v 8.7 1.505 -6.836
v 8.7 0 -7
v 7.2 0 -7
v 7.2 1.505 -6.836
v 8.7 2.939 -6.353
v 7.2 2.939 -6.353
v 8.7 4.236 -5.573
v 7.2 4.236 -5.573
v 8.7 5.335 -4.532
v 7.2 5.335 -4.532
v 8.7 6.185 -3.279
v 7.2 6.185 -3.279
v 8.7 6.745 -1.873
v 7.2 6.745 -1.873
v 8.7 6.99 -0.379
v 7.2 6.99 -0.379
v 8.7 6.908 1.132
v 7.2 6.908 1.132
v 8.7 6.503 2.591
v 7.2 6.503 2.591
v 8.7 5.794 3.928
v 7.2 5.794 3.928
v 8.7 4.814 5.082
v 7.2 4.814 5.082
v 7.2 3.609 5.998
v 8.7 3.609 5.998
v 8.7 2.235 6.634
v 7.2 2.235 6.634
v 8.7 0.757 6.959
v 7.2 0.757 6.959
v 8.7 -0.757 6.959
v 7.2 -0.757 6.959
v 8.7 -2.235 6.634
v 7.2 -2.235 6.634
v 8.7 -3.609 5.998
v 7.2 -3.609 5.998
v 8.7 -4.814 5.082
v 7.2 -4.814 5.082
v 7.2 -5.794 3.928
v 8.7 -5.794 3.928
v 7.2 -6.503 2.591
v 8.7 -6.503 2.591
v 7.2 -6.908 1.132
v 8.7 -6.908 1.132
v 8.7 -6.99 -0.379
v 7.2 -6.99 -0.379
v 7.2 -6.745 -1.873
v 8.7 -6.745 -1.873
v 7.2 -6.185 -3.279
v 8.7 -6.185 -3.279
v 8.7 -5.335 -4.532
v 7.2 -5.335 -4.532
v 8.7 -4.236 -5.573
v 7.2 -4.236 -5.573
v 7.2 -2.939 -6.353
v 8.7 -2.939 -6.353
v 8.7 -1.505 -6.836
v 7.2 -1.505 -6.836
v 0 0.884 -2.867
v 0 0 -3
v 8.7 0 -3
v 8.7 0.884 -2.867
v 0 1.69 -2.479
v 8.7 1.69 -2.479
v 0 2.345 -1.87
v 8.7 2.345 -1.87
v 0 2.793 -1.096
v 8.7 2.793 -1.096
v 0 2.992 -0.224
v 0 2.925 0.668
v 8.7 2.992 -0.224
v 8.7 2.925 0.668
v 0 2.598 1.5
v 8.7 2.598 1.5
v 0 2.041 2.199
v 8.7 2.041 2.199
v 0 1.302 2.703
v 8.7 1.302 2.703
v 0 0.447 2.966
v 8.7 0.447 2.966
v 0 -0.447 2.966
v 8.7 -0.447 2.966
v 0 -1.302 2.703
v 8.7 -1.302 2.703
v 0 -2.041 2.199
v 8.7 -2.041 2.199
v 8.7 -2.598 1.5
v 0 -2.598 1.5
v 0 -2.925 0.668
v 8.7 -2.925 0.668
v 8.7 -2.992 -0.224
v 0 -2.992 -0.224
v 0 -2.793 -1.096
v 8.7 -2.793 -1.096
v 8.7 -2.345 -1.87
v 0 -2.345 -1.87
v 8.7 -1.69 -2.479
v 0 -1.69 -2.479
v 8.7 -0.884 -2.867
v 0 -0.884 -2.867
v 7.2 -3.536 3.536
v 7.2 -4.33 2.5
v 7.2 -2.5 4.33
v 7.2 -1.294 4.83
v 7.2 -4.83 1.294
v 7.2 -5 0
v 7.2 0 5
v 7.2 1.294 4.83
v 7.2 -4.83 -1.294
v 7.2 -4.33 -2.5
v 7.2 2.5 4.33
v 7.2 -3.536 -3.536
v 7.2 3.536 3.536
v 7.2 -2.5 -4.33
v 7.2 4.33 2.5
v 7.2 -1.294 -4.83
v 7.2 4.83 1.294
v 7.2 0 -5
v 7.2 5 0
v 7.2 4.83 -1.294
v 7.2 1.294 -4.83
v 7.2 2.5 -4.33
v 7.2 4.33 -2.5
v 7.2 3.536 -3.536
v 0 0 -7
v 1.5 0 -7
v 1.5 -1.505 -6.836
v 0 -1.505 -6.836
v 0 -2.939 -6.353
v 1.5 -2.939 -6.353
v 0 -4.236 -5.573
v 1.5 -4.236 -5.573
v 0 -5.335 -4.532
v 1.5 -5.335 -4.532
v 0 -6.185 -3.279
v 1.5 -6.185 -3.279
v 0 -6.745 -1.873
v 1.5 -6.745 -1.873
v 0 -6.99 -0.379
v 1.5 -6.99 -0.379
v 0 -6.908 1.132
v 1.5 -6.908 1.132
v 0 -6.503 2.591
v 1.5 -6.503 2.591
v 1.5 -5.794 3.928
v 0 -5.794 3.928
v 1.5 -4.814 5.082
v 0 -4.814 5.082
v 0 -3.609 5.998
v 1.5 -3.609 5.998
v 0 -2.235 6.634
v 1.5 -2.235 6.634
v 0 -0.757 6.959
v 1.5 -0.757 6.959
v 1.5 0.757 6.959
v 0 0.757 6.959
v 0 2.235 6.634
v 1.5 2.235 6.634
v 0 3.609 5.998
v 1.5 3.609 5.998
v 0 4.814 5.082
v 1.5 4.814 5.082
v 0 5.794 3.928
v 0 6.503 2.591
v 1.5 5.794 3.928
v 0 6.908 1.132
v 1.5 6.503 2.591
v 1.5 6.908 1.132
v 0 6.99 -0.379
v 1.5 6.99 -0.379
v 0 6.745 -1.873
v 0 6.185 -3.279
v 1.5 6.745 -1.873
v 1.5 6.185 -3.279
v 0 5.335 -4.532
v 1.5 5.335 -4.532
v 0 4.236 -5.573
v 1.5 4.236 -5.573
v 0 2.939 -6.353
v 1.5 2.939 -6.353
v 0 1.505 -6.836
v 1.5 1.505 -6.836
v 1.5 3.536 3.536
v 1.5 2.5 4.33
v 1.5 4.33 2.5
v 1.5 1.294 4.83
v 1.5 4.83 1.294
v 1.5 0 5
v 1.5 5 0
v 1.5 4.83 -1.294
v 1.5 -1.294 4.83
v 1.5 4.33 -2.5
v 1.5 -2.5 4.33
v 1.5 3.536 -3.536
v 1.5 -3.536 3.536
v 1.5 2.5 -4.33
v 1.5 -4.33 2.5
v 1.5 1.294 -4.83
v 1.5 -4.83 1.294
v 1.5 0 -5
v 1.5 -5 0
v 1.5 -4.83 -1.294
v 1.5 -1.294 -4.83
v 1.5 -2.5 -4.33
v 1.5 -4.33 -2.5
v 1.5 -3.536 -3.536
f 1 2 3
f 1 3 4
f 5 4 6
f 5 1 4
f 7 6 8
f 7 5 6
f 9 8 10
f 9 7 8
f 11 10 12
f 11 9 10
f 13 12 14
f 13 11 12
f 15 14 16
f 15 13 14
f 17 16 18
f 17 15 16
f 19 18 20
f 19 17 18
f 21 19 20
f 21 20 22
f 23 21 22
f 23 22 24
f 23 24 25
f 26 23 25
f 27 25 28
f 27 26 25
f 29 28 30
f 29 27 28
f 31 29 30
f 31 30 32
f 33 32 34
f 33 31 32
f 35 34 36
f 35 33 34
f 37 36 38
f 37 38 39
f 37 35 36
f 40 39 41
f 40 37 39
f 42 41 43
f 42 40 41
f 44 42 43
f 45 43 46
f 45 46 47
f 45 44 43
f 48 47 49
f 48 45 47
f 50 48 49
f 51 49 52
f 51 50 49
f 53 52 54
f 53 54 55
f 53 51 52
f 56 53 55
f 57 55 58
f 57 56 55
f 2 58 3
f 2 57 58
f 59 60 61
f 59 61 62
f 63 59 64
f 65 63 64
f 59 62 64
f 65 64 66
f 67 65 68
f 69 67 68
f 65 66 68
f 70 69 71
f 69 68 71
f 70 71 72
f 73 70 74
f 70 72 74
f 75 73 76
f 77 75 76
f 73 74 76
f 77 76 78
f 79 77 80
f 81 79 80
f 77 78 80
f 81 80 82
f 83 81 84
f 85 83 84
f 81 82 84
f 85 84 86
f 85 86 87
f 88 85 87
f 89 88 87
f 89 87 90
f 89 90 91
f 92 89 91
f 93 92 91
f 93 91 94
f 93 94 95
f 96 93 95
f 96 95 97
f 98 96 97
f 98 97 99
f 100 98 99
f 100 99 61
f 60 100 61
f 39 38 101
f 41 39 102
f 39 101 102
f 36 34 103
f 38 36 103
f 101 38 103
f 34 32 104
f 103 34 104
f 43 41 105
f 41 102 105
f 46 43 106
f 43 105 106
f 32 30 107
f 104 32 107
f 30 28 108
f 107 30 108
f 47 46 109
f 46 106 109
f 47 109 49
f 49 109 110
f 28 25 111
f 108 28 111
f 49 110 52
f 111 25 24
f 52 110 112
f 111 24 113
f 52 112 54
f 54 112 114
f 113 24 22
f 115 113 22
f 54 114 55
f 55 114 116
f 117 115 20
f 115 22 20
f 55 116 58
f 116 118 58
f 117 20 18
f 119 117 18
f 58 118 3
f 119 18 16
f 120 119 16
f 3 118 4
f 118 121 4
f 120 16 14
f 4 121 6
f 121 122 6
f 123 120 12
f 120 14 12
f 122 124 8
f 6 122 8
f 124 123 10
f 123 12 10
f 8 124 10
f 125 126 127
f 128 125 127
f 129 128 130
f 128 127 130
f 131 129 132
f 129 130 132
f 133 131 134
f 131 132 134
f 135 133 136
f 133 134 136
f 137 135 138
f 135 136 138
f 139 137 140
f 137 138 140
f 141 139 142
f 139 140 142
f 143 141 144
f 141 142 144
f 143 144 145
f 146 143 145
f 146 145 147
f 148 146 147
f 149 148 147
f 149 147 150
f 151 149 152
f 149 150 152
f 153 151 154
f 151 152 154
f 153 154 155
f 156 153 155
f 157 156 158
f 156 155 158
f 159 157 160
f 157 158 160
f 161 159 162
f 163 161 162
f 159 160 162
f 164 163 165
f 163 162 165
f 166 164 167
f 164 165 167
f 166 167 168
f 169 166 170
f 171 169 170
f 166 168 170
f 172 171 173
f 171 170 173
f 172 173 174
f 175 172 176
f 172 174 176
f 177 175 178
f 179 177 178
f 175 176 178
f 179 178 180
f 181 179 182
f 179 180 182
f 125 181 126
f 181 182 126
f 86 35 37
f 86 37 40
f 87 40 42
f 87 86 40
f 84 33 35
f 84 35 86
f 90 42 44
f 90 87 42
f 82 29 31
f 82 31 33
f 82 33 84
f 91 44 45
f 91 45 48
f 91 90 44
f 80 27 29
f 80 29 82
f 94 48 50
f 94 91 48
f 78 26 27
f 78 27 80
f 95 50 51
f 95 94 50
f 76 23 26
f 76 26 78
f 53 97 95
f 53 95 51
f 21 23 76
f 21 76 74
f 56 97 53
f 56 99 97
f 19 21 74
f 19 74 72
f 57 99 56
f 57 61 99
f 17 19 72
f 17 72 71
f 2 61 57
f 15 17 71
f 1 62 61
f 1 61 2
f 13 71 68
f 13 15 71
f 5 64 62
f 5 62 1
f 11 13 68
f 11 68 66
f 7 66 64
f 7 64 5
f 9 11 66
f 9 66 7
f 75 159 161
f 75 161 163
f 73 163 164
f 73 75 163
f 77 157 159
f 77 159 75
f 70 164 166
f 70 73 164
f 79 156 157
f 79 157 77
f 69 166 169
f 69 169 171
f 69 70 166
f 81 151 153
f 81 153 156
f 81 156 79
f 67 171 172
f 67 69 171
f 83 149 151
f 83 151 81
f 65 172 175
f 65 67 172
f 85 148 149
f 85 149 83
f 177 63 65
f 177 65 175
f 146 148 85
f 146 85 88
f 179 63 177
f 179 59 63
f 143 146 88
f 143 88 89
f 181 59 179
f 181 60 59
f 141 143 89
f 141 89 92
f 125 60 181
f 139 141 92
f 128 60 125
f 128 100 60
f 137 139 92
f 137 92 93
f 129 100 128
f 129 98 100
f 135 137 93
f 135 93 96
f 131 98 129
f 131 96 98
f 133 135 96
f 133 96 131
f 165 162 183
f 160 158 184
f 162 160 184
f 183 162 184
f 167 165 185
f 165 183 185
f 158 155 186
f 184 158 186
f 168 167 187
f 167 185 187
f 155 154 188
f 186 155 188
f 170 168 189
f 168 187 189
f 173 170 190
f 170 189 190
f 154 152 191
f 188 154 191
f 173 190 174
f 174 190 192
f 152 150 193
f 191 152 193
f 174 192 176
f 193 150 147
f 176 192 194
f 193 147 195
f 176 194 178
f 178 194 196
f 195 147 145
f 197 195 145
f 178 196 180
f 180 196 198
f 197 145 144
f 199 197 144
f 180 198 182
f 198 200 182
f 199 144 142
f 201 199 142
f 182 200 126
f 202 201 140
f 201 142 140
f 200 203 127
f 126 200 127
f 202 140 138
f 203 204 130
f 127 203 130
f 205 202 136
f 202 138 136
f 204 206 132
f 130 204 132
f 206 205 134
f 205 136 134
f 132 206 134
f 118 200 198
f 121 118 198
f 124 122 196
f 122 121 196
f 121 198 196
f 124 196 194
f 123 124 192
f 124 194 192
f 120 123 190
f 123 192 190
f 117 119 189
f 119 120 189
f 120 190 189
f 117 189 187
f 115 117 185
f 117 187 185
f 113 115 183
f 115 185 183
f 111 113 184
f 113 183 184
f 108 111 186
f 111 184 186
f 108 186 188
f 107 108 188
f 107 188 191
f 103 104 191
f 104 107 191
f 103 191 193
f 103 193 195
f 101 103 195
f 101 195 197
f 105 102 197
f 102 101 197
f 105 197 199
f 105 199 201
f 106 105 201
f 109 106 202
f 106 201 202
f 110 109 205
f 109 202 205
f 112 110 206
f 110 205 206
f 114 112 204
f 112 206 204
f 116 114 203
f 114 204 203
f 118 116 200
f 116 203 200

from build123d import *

# Parameters (mm, degrees)
SKETCH_1_R          = 5
EXTRUDE_1_DEPTH     = 8.7
SKETCH_2_R          = 7
EXTRUDE_2_DEPTH     = 1.5
EXTRUDE_START       = -1.5
SKETCH_3_R          = 7
EXTRUDE_3_DEPTH     = 1.5
SKETCH_4_R          = 3
CUT_EXTRUDE_1_DEPTH = 10


with BuildPart() as part:
    # 草图1 → 凸台-拉伸1 (new body)
    with BuildSketch(Plane(origin=(0, 0, 0), x_dir=(0, 0, -1), z_dir=(1, 0, 0))):
        Circle(SKETCH_1_R)
    extrude(amount=EXTRUDE_1_DEPTH)

    # 草图2 → 凸台-拉伸2 (add)
    with BuildSketch(Plane(origin=(8.7, 0, 0), x_dir=(0, 0, -1), z_dir=(1, 0, 0))):
        Circle(SKETCH_2_R)
    extrude(amount=-EXTRUDE_2_DEPTH)

    # 草图3 → 凸台-拉伸3 (add)
    with BuildSketch(Plane.ZY.offset(EXTRUDE_START)):
        with Locations(Location((0, 0, 0), (0, 0, 180))):
            Circle(SKETCH_3_R)
    extrude(amount=EXTRUDE_3_DEPTH)

    # 草图4 → 切除-拉伸1 (cut)
    with BuildSketch(Plane(origin=(8.7, 0, 0), x_dir=(0, 0, -1), z_dir=(1, 0, 0))):
        Circle(SKETCH_4_R)
    extrude(amount=-CUT_EXTRUDE_1_DEPTH, mode=Mode.SUBTRACT)


solid = part.part
